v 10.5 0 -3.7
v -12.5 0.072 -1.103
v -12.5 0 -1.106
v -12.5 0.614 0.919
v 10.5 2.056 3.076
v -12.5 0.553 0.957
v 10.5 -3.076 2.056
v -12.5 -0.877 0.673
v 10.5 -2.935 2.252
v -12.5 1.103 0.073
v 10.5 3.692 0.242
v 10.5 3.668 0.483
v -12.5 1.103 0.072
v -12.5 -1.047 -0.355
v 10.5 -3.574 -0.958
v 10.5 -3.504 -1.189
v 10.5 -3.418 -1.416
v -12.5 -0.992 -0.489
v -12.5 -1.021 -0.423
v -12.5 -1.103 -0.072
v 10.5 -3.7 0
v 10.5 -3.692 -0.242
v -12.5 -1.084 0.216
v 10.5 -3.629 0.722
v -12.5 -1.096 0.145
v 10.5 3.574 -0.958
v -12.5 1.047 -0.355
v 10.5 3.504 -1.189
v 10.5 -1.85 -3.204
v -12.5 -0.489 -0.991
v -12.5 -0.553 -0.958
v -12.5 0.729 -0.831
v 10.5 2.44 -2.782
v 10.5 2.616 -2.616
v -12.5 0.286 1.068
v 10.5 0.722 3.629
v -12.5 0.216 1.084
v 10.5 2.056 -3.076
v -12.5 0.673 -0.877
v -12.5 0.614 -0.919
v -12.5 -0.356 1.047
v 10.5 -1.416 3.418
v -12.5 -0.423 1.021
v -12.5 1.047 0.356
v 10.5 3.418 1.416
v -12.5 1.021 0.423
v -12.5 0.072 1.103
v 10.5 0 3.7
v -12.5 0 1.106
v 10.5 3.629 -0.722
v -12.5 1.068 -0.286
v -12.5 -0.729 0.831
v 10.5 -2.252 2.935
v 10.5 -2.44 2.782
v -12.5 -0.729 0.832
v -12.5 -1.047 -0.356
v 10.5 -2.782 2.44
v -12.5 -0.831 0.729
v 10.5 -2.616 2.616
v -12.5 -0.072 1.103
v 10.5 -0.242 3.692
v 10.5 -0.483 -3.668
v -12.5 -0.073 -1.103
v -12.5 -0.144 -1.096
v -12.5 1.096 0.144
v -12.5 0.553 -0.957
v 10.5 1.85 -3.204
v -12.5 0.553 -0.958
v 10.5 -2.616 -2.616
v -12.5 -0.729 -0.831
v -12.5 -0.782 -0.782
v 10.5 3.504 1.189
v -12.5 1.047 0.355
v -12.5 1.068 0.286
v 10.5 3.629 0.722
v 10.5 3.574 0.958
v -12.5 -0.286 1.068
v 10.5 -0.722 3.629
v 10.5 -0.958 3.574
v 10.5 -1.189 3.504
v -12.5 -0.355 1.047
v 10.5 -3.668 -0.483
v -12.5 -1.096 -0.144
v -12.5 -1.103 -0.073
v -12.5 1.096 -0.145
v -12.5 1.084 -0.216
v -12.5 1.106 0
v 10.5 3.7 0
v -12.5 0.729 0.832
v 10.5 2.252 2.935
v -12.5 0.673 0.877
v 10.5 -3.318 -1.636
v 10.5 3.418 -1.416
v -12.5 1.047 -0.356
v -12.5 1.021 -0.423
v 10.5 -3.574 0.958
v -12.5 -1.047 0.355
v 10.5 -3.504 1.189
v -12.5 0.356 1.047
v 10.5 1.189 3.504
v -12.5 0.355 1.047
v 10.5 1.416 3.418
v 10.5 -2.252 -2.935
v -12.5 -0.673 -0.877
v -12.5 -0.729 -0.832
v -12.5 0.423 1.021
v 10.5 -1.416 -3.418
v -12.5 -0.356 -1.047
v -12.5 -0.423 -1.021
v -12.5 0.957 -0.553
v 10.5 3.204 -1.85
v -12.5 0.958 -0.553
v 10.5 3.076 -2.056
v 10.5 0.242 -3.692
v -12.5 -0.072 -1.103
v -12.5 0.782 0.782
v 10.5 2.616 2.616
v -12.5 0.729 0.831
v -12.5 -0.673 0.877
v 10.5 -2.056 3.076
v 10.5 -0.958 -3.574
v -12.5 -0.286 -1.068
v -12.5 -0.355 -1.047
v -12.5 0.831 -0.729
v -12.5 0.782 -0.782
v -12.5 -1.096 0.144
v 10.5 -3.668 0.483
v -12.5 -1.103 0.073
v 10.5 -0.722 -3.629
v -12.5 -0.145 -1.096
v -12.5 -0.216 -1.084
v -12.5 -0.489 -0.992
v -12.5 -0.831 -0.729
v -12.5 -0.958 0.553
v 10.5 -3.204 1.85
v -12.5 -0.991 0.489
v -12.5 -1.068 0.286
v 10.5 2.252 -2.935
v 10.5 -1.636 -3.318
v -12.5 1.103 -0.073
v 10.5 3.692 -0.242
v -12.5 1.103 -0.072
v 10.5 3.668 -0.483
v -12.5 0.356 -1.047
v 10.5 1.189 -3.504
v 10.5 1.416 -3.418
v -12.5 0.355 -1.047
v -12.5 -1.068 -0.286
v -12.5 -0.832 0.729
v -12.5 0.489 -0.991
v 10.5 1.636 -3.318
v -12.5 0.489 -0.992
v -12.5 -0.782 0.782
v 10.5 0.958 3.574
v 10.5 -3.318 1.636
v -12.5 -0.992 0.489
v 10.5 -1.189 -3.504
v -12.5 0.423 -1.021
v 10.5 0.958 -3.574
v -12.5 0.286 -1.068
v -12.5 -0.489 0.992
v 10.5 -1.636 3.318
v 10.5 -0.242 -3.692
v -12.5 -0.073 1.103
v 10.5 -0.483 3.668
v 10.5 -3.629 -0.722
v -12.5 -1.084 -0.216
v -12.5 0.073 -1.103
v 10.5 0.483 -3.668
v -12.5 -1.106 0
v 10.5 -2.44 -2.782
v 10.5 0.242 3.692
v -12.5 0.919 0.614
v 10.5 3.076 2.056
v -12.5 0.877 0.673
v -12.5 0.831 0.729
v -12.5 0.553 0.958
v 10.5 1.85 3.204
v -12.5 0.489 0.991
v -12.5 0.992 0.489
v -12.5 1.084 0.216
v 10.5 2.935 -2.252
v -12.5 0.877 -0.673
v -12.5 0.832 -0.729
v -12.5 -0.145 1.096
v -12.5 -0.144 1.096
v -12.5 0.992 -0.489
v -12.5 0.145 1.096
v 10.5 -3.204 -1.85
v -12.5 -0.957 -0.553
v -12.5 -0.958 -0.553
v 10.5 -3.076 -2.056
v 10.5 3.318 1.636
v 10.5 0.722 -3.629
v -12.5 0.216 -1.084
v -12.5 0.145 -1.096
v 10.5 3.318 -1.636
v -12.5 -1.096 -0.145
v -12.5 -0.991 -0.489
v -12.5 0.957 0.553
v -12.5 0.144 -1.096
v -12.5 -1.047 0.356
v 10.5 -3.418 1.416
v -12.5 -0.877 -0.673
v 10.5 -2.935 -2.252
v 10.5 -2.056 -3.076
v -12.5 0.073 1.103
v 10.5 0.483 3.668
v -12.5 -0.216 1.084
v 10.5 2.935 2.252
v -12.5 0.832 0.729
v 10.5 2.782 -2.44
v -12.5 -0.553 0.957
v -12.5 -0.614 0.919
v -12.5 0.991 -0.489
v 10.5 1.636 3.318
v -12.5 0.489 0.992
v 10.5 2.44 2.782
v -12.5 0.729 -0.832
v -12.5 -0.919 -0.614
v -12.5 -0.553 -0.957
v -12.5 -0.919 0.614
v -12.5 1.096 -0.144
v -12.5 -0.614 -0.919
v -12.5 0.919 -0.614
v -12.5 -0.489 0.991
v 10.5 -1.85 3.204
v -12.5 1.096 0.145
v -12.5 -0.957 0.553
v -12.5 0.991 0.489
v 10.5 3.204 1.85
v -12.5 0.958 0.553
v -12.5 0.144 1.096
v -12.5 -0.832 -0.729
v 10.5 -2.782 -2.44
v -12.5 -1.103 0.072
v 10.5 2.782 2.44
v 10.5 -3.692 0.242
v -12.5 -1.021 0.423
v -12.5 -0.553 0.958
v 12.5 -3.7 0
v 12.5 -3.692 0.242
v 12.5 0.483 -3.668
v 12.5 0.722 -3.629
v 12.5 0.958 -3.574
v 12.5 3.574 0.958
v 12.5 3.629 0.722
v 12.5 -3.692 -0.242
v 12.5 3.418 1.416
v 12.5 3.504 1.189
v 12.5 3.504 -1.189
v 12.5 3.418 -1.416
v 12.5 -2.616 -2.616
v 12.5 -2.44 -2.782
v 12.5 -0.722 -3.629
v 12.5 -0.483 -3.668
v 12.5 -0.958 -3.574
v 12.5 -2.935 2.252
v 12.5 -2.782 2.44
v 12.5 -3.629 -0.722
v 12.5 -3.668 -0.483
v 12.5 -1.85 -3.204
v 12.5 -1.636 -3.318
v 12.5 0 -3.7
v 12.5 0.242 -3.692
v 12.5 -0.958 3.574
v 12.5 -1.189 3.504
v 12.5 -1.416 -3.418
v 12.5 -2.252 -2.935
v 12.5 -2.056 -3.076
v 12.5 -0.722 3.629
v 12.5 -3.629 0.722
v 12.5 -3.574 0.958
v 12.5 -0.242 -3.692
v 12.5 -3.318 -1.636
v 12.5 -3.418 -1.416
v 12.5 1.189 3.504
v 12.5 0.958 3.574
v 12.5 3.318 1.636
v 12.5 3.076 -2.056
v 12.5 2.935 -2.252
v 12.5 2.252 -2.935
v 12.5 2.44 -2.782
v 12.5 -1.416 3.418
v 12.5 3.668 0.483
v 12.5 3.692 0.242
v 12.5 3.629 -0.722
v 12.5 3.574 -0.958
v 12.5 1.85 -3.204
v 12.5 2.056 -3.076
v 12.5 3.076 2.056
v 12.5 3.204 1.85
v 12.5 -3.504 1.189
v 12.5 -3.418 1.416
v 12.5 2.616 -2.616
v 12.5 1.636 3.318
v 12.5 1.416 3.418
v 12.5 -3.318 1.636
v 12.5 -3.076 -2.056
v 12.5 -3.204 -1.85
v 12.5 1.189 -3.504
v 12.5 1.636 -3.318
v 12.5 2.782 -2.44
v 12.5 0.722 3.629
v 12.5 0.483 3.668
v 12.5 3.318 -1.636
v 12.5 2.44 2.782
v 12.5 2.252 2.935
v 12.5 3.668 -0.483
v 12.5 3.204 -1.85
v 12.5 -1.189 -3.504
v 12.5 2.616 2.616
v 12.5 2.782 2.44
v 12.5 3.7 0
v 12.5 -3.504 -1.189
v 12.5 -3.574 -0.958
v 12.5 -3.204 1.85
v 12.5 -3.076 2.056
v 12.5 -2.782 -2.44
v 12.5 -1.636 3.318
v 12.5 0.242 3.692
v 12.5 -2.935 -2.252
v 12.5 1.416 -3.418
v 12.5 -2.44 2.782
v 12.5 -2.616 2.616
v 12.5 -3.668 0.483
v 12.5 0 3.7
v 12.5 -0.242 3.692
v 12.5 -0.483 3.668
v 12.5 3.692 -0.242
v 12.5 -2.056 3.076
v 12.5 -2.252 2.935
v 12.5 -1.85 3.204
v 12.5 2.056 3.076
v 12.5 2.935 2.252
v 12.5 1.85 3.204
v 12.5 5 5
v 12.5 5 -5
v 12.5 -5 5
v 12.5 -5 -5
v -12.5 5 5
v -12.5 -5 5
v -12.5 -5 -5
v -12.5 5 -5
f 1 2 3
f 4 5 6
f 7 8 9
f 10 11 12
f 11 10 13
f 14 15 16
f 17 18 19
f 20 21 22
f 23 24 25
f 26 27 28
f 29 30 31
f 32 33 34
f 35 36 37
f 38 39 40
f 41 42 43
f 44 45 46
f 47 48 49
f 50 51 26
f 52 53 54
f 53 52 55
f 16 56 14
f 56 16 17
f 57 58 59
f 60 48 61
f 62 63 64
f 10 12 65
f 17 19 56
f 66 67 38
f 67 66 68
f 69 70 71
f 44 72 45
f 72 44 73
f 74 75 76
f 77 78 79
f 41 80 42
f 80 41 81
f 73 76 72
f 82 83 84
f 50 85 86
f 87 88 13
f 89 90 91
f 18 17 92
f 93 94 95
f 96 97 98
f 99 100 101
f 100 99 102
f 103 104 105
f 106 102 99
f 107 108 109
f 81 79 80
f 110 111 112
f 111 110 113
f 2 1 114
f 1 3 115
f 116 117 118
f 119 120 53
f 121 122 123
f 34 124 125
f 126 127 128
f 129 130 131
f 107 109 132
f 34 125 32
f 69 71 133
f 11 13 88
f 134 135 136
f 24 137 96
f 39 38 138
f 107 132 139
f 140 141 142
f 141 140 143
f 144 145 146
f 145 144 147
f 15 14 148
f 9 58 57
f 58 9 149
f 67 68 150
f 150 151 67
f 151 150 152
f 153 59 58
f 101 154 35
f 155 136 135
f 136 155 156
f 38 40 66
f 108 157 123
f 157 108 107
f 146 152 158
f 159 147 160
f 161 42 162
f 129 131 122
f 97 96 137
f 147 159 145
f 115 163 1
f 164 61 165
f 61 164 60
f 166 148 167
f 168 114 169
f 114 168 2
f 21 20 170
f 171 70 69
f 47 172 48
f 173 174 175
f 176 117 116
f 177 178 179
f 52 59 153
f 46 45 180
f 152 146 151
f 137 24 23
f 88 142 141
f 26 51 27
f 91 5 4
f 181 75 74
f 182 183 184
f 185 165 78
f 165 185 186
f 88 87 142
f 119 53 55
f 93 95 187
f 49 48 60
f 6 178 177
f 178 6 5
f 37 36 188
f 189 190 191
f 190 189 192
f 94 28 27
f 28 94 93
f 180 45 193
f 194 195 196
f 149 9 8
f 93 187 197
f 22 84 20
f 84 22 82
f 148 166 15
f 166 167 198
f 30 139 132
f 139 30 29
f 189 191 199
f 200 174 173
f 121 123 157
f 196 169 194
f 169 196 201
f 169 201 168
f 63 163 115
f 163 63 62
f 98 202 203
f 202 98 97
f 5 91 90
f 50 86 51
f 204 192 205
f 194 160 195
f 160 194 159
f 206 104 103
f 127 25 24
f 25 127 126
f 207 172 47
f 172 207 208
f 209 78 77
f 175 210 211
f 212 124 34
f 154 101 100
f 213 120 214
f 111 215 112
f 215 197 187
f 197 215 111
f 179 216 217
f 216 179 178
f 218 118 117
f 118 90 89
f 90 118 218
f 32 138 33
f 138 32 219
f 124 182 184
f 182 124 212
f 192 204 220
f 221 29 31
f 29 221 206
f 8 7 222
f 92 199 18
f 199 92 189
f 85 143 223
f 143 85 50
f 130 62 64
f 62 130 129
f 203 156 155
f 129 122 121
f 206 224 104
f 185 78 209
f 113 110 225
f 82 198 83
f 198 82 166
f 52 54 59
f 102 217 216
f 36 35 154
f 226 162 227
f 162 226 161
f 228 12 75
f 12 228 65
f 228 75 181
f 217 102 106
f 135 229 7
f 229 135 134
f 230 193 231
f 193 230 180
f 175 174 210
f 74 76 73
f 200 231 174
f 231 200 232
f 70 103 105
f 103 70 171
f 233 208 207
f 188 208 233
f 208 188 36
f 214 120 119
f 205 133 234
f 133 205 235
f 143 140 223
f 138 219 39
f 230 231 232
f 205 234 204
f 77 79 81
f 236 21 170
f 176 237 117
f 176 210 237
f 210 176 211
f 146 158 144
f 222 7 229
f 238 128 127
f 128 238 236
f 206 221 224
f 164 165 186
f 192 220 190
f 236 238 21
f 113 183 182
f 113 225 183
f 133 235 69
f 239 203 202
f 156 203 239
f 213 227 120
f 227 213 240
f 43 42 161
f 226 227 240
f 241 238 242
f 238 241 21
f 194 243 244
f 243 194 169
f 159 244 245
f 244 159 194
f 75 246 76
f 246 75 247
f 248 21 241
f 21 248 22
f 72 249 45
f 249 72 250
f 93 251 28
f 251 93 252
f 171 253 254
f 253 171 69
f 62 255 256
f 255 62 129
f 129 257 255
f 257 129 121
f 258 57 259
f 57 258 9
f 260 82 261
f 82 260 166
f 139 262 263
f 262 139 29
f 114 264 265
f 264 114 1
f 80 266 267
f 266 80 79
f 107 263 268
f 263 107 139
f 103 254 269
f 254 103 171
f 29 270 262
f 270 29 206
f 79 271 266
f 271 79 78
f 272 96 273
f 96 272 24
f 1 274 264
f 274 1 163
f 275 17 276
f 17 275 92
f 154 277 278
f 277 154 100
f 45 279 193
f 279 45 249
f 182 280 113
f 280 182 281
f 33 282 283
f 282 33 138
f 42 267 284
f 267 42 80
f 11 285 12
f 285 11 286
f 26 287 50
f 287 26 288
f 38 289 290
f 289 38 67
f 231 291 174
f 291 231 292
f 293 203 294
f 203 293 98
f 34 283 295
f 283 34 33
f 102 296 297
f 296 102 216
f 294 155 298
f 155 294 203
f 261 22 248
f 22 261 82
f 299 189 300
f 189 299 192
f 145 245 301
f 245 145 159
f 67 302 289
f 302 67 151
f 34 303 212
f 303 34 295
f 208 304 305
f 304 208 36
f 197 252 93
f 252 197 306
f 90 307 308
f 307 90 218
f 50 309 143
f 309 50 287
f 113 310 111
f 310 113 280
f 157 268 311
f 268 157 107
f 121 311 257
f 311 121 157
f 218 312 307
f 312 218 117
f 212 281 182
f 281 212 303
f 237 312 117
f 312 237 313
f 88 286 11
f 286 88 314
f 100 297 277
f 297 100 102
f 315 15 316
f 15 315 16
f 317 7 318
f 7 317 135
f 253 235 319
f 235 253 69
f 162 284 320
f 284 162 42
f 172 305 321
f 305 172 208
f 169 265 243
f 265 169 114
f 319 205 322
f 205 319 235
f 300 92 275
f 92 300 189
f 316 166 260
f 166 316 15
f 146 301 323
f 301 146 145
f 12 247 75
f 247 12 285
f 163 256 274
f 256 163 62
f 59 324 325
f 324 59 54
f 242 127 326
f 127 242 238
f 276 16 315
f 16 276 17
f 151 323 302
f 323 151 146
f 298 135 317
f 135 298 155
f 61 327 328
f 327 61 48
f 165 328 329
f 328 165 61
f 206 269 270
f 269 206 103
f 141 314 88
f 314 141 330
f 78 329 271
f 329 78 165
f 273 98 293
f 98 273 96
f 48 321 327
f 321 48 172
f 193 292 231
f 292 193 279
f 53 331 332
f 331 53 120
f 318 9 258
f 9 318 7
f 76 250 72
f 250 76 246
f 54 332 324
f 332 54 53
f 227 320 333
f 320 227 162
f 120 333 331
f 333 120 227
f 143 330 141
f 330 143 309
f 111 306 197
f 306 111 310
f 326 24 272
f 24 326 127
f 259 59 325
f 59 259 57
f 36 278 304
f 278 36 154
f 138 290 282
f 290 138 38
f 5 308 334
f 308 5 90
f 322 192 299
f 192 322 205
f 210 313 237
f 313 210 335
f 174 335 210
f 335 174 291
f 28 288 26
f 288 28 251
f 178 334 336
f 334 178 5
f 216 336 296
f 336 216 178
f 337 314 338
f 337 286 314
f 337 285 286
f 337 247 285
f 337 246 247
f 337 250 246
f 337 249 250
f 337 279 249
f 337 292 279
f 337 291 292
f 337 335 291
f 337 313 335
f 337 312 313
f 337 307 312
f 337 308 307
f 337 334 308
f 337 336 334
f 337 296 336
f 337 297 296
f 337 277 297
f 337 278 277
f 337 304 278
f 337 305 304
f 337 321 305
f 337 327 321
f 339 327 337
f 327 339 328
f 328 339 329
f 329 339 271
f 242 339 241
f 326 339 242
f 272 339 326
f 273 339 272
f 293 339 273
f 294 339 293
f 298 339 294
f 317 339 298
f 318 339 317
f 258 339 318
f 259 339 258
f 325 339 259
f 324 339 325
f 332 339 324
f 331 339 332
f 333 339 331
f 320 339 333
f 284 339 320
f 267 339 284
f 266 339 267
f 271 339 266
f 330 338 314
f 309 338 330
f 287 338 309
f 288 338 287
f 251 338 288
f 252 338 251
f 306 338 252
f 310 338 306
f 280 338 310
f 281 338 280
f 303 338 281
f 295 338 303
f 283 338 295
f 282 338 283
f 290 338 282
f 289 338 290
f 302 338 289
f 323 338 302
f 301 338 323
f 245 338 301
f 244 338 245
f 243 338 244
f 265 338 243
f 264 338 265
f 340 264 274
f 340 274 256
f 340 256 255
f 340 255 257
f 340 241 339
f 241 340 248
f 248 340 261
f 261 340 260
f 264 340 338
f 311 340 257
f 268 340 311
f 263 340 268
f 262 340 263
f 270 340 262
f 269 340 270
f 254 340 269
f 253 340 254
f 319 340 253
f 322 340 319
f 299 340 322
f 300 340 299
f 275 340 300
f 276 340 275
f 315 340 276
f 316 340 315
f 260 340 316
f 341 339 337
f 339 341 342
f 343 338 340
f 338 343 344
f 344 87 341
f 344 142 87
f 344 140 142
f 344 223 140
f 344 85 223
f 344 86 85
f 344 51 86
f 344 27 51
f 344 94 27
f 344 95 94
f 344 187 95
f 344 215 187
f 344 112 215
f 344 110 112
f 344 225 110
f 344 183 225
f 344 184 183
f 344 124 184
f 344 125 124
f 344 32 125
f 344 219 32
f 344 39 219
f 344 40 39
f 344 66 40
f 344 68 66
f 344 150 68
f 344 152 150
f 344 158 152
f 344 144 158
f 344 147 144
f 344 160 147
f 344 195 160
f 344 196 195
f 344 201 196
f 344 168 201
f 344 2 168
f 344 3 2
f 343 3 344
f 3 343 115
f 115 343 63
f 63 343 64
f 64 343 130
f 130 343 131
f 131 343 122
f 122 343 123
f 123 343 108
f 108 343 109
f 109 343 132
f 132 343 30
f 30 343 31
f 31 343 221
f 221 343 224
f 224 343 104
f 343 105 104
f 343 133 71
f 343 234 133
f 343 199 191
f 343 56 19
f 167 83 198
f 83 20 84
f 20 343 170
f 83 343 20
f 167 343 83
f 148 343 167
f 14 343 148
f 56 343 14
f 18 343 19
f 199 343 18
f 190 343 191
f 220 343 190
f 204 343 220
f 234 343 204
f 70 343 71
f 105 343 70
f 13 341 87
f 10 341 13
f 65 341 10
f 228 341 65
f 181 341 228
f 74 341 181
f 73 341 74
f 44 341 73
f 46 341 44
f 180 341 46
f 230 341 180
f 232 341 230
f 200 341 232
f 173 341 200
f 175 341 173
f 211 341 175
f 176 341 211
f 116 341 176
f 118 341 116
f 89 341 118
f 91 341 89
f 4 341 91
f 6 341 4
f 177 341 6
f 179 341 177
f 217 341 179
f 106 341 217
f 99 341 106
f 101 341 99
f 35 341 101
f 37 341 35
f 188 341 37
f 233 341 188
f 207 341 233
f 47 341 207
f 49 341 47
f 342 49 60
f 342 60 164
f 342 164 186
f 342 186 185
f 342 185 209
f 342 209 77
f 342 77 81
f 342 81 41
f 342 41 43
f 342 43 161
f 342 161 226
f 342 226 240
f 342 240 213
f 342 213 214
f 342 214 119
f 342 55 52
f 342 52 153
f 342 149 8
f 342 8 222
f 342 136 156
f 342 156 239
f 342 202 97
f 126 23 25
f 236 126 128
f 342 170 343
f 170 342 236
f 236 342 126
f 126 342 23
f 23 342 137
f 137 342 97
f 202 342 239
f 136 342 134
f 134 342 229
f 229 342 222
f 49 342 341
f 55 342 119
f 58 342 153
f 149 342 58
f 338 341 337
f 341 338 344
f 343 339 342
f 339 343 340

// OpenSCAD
/*[Parametros]*/
folga = 0.2; // mm
part = "all";

// Bloco externo fixo (mm)
block_len = 25;
block_w = 10;
block_h = 10;

// Perfil interno nominal da caneta (mm)
cone_len = 23;
tip_d_nominal = 2.0;
base_d_nominal = 7.2;

// Evita diametros invalidos
function _max2(a, b) = a > b ? a : b;

tip_d = _max2(0.2, tip_d_nominal + folga);
base_d = _max2(tip_d, base_d_nominal + folga);

tail_len = block_len - cone_len; // 2 mm
start_x = -block_len / 2;
cone_end_x = start_x + cone_len;

eps = 0.05;

module body() {
    difference() {
        cube([block_len, block_w, block_h], center = true);

        union() {
            // Trecho conico: 0-23 mm, d2 -> d7.2
            translate([start_x - eps, 0, 0])
                rotate([0, 90, 0])
                    cylinder(
                        h = cone_len + eps,
                        d1 = tip_d,
                        d2 = base_d,
                        $fn = 96
                    );

            // Trecho cilindrico final: 23-25 mm, d7.2 constante
            translate([cone_end_x, 0, 0])
                rotate([0, 90, 0])
                    cylinder(
                        h = tail_len + eps,
                        d = base_d,
                        $fn = 96
                    );
        }
    }
}

if (part == "body") {
    body();
} else {
    body();
}
